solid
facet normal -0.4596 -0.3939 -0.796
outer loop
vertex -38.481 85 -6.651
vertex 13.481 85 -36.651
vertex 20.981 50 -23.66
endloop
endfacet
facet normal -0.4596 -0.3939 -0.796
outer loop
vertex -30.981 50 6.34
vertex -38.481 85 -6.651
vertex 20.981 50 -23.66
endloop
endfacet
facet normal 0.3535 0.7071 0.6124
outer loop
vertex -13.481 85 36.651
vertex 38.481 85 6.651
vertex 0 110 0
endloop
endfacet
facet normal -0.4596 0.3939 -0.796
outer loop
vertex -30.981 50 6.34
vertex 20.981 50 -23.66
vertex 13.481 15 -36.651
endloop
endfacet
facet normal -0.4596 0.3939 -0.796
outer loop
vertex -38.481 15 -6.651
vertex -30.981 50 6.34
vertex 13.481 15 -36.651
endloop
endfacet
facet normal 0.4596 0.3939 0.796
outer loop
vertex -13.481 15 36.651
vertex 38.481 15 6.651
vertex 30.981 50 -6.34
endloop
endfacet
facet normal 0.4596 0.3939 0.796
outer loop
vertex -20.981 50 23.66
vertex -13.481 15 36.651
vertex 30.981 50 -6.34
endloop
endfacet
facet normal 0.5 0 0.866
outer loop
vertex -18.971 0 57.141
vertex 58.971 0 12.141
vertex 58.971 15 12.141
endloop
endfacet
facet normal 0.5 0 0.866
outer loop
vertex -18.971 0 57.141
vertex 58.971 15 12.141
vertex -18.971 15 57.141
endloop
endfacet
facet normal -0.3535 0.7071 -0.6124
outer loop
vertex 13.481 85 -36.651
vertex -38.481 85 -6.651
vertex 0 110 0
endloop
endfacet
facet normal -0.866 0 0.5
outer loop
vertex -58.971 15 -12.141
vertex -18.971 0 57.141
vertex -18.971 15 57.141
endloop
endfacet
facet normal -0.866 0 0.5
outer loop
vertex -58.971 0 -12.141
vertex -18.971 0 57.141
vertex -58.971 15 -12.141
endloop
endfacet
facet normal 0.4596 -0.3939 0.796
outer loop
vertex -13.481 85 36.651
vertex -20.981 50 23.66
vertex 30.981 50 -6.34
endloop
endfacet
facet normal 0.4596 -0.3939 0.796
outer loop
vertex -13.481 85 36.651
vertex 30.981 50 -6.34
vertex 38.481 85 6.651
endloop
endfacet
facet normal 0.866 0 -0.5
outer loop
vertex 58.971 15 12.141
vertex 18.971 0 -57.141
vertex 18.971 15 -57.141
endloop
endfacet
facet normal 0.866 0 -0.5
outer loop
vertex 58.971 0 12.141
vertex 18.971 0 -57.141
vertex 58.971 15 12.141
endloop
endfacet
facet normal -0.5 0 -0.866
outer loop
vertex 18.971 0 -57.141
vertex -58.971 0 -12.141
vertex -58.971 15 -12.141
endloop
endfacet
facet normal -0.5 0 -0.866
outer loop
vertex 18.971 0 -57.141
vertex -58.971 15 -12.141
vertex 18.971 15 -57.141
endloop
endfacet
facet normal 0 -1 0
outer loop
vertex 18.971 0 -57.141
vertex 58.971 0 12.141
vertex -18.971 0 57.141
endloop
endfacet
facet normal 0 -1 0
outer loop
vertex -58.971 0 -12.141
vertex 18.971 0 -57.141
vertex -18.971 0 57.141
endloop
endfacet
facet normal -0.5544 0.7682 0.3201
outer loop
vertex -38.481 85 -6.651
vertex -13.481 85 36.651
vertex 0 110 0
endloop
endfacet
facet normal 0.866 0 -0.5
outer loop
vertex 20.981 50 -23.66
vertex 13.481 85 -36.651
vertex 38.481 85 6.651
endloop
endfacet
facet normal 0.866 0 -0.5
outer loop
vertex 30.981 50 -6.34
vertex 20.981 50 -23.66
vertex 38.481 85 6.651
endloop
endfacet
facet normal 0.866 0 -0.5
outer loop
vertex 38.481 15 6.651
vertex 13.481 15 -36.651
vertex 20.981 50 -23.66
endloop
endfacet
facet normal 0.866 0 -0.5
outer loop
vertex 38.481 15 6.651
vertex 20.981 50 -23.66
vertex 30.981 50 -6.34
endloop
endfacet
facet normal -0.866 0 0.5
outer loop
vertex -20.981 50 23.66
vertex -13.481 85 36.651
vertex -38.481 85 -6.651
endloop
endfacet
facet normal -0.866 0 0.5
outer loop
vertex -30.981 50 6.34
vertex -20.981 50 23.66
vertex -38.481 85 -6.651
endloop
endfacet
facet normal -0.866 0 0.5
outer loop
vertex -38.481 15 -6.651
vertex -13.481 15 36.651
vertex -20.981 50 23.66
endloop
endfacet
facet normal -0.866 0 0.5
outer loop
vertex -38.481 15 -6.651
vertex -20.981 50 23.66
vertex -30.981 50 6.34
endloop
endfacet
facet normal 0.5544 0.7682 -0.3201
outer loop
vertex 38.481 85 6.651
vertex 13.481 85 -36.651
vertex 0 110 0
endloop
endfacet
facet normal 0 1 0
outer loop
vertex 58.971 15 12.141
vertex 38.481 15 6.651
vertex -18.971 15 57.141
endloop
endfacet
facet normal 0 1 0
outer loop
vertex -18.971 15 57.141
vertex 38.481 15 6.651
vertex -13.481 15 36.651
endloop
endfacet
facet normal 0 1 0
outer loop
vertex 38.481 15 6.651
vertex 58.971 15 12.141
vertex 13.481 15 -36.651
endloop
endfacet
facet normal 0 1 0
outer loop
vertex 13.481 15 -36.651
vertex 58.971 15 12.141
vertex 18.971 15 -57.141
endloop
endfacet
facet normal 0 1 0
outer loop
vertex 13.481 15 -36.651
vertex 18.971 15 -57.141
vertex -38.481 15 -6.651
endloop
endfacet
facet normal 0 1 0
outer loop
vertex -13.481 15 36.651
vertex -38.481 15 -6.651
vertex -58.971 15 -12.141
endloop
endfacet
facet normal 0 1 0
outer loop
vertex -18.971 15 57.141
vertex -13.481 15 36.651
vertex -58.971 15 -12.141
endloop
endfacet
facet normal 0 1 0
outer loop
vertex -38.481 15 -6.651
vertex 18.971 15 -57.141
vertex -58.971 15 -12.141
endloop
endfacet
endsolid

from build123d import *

# Parameters (mm, degrees)
EXTRUDE1_DEPTH     = 15
EXTRUDE2_DEPTH     = 70
CUT_EXTRUDE1_DEPTH = 60


with BuildPart() as part:
    # Sketch1 → Extrude1 (new body)
    with BuildSketch(Plane(origin=(0, 0, 0), x_dir=(1, 0, 0), z_dir=(0, 1, 0))):
        Polygon((-58.97114317, 12.141016151), (18.97114317, 57.141016151), (58.97114317, -12.141016151), (-18.97114317, -57.141016151), align=None)
    extrude(amount=EXTRUDE1_DEPTH)

    # Sketch2 → Extrude2 (add)
    with BuildSketch(Plane(origin=(0, 15, 0), x_dir=(-1, 0, 0), z_dir=(0, 1, 0))):
        Polygon((38.480762114, -6.650635095), (-13.480762114, -36.650635095), (-38.480762114, 6.650635095), (13.480762114, 36.650635095), align=None)
    extrude(amount=EXTRUDE2_DEPTH)

    # Sketch3 → Cut-Extrude1 (cut)
    with BuildSketch(Plane(origin=(-25.980762114, 0, 15), x_dir=(0.5, 0, 0.866025404), z_dir=(-0.866025404, 0, 0.5))):
        Polygon((-25, 15), (-25, 85), (-10, 50), align=None)
        Polygon((25, 85), (25, 15), (10, 50), align=None)
    extrude(amount=-CUT_EXTRUDE1_DEPTH, mode=Mode.SUBTRACT)

    # Sketch4 → Loft1 section 0
    with BuildSketch(Plane(origin=(0, 85, 0), x_dir=(-1, 0, 0), z_dir=(0, 1, 0)), mode=Mode.PRIVATE) as loft1_s0:
        Polygon((38.480762114, -6.650635095), (-13.480762114, -36.650635095), (-38.480762114, 6.650635095), (13.480762114, 36.650635095), align=None)
    loft([loft1_s0.sketch, Vertex(0, 110, 0)])


solid = part.part
